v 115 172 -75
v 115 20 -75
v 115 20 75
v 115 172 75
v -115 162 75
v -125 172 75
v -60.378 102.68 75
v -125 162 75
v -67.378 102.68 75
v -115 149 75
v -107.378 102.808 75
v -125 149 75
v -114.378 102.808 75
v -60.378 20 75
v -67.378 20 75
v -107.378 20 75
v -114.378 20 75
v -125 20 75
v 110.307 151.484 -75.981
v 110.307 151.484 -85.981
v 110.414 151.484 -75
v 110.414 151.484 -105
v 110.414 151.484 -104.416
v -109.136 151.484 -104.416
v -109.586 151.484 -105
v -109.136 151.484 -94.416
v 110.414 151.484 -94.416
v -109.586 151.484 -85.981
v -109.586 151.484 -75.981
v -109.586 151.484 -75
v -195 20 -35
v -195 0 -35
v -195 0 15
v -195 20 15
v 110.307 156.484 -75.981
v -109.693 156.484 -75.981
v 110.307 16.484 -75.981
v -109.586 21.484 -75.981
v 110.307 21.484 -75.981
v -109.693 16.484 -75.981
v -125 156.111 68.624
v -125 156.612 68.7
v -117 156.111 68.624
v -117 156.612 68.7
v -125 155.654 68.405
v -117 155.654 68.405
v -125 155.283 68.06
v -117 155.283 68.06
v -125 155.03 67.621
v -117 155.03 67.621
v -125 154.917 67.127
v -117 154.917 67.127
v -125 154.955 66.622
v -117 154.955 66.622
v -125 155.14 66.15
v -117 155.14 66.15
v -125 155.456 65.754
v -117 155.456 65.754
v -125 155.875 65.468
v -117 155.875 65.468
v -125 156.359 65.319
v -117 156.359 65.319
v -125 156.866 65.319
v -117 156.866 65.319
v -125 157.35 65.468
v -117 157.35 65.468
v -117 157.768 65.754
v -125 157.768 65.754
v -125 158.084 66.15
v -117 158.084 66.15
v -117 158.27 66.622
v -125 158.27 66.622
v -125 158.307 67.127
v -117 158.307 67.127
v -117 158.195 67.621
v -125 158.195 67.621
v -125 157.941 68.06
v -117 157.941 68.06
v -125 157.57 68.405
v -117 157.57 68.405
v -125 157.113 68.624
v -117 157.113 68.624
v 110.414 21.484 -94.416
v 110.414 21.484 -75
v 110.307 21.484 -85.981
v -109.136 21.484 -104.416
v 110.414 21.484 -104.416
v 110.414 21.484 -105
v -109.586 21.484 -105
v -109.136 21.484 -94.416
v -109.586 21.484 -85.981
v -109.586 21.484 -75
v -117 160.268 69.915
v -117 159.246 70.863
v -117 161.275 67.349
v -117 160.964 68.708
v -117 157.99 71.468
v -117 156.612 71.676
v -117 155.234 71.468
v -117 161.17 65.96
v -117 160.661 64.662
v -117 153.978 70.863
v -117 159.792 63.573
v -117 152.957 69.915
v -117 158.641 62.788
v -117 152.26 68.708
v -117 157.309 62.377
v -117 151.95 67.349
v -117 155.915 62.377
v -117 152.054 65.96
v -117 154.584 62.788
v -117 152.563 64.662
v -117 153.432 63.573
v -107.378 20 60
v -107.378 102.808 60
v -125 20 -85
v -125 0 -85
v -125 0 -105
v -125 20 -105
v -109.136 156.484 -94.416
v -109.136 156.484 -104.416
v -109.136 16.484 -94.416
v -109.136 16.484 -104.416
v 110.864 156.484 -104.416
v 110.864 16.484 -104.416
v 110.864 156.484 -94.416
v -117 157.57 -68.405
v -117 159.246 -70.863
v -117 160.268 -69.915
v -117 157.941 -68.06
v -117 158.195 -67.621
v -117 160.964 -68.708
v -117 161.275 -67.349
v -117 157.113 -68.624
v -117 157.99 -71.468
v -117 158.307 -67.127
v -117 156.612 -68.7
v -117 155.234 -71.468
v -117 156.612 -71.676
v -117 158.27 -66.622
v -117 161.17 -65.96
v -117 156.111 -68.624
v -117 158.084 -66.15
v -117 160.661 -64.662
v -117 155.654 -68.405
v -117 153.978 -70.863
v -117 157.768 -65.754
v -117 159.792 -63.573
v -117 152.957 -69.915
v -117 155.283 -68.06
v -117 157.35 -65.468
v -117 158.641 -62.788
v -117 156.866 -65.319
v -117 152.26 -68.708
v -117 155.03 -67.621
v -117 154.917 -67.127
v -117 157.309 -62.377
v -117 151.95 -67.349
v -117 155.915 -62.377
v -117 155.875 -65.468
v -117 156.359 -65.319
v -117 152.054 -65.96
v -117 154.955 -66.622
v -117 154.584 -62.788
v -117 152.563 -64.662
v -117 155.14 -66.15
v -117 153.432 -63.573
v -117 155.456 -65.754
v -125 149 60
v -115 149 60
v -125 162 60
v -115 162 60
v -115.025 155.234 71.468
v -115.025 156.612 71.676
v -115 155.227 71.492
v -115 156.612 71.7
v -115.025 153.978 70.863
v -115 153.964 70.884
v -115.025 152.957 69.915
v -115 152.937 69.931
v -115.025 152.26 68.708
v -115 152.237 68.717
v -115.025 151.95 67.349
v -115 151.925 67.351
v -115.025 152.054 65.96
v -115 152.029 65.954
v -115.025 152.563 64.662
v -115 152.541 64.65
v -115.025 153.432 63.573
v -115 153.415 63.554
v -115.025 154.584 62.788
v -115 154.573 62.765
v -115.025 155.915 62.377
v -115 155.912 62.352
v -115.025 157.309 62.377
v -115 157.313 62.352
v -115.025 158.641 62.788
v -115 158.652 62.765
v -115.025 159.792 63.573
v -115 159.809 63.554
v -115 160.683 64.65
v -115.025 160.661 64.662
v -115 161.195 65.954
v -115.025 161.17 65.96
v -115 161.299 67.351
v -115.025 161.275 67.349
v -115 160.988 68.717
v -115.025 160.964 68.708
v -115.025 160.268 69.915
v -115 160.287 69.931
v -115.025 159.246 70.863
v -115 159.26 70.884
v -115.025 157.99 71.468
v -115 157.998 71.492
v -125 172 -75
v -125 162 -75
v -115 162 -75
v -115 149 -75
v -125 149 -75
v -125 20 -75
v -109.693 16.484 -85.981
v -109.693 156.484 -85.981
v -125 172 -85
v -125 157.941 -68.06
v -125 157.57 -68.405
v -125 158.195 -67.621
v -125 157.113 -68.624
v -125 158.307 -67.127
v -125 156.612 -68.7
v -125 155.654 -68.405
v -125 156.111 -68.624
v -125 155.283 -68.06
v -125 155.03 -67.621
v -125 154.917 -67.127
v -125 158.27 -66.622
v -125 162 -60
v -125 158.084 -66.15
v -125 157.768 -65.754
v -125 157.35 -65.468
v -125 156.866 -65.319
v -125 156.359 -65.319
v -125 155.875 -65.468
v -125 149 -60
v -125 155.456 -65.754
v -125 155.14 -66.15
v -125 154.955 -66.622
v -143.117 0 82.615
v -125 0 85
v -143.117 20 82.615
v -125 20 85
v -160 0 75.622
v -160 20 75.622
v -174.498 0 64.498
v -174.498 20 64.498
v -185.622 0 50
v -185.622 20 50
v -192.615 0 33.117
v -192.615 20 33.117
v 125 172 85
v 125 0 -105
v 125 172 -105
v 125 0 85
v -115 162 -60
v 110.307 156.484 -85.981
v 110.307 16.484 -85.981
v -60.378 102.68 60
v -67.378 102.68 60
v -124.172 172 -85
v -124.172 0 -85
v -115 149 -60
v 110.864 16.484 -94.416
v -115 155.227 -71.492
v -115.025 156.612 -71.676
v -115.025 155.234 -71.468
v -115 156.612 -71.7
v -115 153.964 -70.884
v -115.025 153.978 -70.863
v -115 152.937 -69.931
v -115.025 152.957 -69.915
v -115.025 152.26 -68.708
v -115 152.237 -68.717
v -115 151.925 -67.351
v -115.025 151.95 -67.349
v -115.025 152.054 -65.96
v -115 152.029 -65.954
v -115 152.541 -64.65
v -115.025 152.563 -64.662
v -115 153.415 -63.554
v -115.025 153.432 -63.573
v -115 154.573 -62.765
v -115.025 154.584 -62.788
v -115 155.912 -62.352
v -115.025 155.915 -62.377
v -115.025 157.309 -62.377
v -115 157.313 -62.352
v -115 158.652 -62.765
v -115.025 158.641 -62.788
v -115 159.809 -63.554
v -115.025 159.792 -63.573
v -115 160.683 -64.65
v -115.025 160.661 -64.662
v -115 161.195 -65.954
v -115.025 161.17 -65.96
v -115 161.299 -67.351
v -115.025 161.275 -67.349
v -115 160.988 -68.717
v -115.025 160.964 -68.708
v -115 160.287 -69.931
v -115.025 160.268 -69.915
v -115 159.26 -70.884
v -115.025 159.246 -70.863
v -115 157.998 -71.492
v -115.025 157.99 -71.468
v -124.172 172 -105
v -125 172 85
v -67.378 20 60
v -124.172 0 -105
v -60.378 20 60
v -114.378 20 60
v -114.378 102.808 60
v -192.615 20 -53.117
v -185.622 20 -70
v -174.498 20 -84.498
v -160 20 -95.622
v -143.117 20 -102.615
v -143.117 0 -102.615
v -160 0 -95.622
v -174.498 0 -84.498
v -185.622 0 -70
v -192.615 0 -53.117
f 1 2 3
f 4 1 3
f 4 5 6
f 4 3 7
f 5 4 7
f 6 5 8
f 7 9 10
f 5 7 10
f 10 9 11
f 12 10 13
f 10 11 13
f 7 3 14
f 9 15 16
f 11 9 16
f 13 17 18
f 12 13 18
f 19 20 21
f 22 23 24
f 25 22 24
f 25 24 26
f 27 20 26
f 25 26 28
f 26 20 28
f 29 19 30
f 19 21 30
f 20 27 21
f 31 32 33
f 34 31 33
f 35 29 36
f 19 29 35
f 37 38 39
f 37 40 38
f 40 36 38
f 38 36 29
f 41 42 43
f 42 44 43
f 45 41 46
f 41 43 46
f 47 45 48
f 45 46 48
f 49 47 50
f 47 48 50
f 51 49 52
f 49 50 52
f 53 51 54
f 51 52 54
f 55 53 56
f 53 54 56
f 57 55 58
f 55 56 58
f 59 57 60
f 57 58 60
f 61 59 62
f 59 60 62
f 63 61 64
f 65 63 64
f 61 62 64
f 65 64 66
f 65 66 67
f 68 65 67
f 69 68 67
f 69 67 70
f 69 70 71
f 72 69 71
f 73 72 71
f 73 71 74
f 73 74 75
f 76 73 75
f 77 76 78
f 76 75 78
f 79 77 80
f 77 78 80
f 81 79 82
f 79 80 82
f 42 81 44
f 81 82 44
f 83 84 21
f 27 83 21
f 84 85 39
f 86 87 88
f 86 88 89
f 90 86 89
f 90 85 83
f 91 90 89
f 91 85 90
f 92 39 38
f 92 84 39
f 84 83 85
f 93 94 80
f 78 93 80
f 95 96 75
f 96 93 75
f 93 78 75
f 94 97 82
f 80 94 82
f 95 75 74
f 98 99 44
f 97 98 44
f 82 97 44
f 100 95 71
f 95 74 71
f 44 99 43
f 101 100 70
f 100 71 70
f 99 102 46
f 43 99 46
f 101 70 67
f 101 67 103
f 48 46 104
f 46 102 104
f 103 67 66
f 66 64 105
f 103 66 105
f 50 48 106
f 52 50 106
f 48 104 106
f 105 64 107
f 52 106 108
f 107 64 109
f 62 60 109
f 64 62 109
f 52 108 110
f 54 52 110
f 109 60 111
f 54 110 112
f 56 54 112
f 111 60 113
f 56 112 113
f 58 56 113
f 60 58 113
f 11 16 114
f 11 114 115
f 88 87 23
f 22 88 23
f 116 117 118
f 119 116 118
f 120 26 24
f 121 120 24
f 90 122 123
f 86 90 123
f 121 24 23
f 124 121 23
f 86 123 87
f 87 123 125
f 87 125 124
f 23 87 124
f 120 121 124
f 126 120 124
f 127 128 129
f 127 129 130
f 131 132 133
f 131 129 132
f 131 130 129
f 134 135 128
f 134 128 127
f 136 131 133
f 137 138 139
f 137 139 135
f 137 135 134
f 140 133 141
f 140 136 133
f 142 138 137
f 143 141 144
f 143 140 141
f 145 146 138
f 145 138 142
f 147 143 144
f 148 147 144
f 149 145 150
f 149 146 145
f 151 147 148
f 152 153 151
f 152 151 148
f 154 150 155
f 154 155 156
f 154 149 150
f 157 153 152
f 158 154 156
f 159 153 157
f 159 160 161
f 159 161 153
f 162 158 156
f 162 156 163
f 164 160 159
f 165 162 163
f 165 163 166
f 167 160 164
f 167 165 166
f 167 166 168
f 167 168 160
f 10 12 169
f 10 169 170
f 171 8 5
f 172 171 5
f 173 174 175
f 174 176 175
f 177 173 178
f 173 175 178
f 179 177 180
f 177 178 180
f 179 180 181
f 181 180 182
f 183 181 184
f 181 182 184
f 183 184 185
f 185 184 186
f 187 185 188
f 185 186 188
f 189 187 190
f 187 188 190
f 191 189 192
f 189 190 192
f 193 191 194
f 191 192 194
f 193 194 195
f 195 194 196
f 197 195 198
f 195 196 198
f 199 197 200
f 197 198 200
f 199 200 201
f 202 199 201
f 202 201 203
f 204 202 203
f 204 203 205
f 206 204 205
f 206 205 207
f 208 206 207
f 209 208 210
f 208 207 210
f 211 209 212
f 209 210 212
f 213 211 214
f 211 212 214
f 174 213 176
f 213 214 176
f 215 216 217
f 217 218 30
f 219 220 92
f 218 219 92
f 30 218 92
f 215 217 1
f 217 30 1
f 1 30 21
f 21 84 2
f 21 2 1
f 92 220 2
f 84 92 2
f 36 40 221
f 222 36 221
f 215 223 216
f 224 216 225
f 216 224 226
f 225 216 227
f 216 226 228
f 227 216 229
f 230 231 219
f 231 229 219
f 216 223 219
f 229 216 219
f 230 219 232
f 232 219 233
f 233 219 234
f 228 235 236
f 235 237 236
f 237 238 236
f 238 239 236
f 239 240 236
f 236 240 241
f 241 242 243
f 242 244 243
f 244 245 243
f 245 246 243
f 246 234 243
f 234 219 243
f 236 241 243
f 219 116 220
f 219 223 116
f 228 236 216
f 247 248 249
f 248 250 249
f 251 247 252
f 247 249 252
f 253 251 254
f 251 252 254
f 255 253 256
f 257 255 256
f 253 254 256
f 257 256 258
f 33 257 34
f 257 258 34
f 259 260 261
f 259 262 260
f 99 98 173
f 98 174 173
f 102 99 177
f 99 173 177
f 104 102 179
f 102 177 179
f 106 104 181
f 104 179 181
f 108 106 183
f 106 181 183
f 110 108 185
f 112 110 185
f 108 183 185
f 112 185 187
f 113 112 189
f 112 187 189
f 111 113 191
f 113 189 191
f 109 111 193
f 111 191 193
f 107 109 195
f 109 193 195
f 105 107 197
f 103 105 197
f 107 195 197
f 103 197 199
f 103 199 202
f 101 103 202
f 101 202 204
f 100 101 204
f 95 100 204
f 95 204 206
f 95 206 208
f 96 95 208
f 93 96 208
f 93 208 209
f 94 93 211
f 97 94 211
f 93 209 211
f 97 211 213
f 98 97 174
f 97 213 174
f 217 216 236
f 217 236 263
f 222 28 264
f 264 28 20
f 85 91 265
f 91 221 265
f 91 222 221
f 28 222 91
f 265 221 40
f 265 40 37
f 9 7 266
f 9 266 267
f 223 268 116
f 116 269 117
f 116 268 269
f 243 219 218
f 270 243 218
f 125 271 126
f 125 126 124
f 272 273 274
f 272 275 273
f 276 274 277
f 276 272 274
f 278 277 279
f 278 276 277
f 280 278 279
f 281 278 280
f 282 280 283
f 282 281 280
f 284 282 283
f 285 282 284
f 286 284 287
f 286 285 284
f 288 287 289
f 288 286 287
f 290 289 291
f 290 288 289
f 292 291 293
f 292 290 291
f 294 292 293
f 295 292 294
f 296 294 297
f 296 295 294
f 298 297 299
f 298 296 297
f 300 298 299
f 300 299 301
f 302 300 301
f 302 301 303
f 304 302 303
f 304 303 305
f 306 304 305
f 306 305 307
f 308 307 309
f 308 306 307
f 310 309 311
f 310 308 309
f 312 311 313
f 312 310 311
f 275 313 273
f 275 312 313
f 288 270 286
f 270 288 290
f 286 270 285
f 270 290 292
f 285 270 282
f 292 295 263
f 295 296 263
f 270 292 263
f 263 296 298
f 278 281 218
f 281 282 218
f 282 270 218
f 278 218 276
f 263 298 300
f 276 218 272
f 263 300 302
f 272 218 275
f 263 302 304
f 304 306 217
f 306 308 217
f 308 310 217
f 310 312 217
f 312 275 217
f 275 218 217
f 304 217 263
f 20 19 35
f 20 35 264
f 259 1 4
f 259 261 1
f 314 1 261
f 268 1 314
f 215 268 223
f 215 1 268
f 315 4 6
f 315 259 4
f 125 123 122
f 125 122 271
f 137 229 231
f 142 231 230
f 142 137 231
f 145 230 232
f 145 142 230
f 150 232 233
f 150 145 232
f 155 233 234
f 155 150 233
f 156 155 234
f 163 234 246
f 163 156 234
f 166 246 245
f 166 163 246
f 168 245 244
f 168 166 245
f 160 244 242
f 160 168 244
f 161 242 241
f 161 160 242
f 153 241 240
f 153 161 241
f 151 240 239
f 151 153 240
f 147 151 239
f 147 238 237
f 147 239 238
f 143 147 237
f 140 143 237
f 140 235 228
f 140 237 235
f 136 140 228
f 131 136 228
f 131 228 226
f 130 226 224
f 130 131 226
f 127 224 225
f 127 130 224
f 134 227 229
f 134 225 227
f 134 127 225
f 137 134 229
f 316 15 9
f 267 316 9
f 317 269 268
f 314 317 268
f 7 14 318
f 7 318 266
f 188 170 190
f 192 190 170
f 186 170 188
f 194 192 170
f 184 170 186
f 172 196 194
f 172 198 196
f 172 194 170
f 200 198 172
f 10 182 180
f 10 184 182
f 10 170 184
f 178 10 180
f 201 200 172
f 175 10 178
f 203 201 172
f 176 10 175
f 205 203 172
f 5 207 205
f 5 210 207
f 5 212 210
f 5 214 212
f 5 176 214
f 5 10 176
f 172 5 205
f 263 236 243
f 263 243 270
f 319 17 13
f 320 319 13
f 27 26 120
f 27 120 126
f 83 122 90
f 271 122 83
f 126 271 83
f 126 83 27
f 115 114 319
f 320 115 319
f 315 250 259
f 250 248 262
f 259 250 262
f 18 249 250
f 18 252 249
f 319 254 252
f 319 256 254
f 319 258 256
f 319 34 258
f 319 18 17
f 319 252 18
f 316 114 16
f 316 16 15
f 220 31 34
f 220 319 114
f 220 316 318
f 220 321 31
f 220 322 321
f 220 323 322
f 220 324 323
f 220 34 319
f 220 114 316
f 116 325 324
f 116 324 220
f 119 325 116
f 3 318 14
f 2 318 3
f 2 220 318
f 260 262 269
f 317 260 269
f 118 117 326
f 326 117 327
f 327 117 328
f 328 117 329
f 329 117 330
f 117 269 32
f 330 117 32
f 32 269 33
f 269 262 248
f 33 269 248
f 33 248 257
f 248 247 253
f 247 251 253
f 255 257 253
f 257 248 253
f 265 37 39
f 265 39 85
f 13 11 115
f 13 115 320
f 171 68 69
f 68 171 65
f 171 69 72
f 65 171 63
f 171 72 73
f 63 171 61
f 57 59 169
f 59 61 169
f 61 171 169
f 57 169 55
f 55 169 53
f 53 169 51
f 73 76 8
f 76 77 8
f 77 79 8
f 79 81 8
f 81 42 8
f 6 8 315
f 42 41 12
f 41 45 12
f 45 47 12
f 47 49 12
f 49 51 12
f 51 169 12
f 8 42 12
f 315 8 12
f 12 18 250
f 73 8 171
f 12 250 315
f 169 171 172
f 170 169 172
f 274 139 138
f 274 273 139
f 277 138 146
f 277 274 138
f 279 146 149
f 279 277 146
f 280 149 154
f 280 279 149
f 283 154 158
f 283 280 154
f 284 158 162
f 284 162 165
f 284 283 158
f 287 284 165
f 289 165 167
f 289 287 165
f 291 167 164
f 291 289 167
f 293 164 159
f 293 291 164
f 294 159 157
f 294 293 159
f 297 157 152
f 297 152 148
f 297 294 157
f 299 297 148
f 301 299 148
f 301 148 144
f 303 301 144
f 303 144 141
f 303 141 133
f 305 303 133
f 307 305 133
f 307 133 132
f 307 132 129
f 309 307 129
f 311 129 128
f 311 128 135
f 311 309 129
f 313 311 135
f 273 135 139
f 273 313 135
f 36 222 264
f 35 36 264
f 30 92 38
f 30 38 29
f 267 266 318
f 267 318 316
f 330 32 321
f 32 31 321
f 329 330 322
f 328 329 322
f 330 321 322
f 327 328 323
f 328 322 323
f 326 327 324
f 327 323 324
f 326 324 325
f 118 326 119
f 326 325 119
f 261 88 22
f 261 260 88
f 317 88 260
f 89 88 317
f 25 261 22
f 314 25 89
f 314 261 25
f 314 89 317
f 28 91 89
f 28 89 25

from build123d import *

# Parameters (mm, degrees)
BOSS_EXTRUDE1_DEPTH     = 172
BOSS_EXTRUDE2_DEPTH     = 20
SKETCH2_W               = 10
SKETCH2_H               = 13
BOSS_EXTRUDE3_DEPTH     = 15
SKETCH6_W               = 7
SKETCH6_H               = 82.975623271
BOSS_EXTRUDE4_DEPTH     = 15
SKETCH9_W               = 249.172322426
SKETCH9_H               = 172
BOSS_EXTRUDE7_DEPTH     = 20
CUT_EXTRUDE3_DEPTH      = 75
CUT_EXTRUDE3_DEPTH_BACK = 75
SKETCH11_W              = 220
SKETCH11_H              = 130
CUT_EXTRUDE4_DEPTH      = 135
CUT_EXTRUDE4_DEPTH_BACK = 5
SKETCH12_W              = 220
SKETCH12_H              = 10
FILLET2_R               = 70


with BuildPart() as part:
    # Sketch1 → Boss-Extrude1 (new body)
    with BuildSketch(Plane(origin=(0, 0, 0), x_dir=(1, 0, 0), z_dir=(0, 1, 0))):
        Polygon((-125, -75), (-125, -85), (125, -85), (125, 85), (-125, 85), (-125, 75), (115, 75), (115, -75), align=None)
    extrude(amount=BOSS_EXTRUDE1_DEPTH)

    # Sketch1<3> → Boss-Extrude2 (add)
    with BuildSketch(Plane(origin=(0, 0, 0), x_dir=(1, 0, 0), z_dir=(0, 1, 0))):
        Polygon((-195, -85), (-125, -85), (-125, -75), (115, -75), (115, 75), (-125, 75), (-125, 105), (-195, 105), align=None)
    extrude(amount=BOSS_EXTRUDE2_DEPTH)

    # Sketch2 → Boss-Extrude3 (add)
    with BuildSketch(Plane.XY.offset(-75)):
        with Locations((-120, 155.5)):
            Rectangle(SKETCH2_W, SKETCH2_H)
    boss_extrude3 = extrude(amount=BOSS_EXTRUDE3_DEPTH)

    # Sketch5 → CBORE for M3 Hex Head Cap Screw1 (revolve, cut)
    with BuildSketch(Plane(origin=(-115, 156.612141417, -67), x_dir=(0, 0, -1), z_dir=(0, 1, 0))):
        Polygon((0, 0), (0, 80), (1.7, 80), (1.7, 2), (4.6755, 2), (4.6755, 0.025), (4.7005, 0), align=None)
    cbore_for_m3_hex_head_cap_screw1 = revolve(axis=Axis((-108.65, 156.612141417, -67), (-1, 0, 0)), mode=Mode.SUBTRACT)

    # Mirror1: Boss-Extrude3, CBORE for M3 Hex Head Cap Screw1 across plane
    add(boss_extrude3.mirror(Plane.XY))
    add(cbore_for_m3_hex_head_cap_screw1.mirror(Plane.XY), mode=Mode.SUBTRACT)

    # Sketch6 → Boss-Extrude4 (add)
    with BuildSketch(Plane(origin=(0, 0, 75), x_dir=(-1, 0, 0), z_dir=(0, 0, -1))):
        with Locations((110.877553526, 61.319998757)):
            Rectangle(SKETCH6_W, SKETCH6_H)
        with Locations((63.877553526, 61.191761533)):
            Rectangle(SKETCH6_W, SKETCH6_H)
    extrude(amount=BOSS_EXTRUDE4_DEPTH)

    # Sketch9 → Boss-Extrude7 (add)
    with BuildSketch(Plane(origin=(0, 0, -85), x_dir=(-1, 0, 0), z_dir=(0, 0, -1))):
        with Locations((-0.413838787, 86)):
            Rectangle(SKETCH9_W, SKETCH9_H)
    extrude(amount=BOSS_EXTRUDE7_DEPTH)

    # Sketch11 → Cut-Extrude3 (cut, two sides: drawn at the far end of the back side and taken through both)
    with BuildSketch(Plane(origin=(0, 0, -105), x_dir=(-1, 0, 0), z_dir=(0, 0, -1)).offset(-CUT_EXTRUDE3_DEPTH_BACK)):
        with Locations((-0.413838787, 86.484091926)):
            Rectangle(SKETCH11_W, SKETCH11_H)
    extrude(amount=CUT_EXTRUDE3_DEPTH + CUT_EXTRUDE3_DEPTH_BACK, mode=Mode.SUBTRACT)

    # Sketch12 → Cut-Extrude4 (cut, two sides: drawn at the far end of the back side and taken through both)
    with BuildSketch(Plane(origin=(0, 21.484091926, 0), x_dir=(1, 0, 0), z_dir=(0, 1, 0)).offset(-CUT_EXTRUDE4_DEPTH_BACK)):
        with Locations((0.863655378, 99.416077233)):
            Rectangle(SKETCH12_W, SKETCH12_H)
        with Locations((0.307194527, 80.981434553)):
            Rectangle(SKETCH12_W, SKETCH12_H)
    extrude(amount=CUT_EXTRUDE4_DEPTH + CUT_EXTRUDE4_DEPTH_BACK, mode=Mode.SUBTRACT)

    # Fillet2
    fillet2_edges = [part.edges().sort_by_distance(p)[0] for p in [
        (-195, 10, 85),
        (-195, 10, -105),
    ]]
    fillet(fillet2_edges, radius=FILLET2_R - 0.0001)  # a hair under: the kernel refuses the full size


solid = part.part
